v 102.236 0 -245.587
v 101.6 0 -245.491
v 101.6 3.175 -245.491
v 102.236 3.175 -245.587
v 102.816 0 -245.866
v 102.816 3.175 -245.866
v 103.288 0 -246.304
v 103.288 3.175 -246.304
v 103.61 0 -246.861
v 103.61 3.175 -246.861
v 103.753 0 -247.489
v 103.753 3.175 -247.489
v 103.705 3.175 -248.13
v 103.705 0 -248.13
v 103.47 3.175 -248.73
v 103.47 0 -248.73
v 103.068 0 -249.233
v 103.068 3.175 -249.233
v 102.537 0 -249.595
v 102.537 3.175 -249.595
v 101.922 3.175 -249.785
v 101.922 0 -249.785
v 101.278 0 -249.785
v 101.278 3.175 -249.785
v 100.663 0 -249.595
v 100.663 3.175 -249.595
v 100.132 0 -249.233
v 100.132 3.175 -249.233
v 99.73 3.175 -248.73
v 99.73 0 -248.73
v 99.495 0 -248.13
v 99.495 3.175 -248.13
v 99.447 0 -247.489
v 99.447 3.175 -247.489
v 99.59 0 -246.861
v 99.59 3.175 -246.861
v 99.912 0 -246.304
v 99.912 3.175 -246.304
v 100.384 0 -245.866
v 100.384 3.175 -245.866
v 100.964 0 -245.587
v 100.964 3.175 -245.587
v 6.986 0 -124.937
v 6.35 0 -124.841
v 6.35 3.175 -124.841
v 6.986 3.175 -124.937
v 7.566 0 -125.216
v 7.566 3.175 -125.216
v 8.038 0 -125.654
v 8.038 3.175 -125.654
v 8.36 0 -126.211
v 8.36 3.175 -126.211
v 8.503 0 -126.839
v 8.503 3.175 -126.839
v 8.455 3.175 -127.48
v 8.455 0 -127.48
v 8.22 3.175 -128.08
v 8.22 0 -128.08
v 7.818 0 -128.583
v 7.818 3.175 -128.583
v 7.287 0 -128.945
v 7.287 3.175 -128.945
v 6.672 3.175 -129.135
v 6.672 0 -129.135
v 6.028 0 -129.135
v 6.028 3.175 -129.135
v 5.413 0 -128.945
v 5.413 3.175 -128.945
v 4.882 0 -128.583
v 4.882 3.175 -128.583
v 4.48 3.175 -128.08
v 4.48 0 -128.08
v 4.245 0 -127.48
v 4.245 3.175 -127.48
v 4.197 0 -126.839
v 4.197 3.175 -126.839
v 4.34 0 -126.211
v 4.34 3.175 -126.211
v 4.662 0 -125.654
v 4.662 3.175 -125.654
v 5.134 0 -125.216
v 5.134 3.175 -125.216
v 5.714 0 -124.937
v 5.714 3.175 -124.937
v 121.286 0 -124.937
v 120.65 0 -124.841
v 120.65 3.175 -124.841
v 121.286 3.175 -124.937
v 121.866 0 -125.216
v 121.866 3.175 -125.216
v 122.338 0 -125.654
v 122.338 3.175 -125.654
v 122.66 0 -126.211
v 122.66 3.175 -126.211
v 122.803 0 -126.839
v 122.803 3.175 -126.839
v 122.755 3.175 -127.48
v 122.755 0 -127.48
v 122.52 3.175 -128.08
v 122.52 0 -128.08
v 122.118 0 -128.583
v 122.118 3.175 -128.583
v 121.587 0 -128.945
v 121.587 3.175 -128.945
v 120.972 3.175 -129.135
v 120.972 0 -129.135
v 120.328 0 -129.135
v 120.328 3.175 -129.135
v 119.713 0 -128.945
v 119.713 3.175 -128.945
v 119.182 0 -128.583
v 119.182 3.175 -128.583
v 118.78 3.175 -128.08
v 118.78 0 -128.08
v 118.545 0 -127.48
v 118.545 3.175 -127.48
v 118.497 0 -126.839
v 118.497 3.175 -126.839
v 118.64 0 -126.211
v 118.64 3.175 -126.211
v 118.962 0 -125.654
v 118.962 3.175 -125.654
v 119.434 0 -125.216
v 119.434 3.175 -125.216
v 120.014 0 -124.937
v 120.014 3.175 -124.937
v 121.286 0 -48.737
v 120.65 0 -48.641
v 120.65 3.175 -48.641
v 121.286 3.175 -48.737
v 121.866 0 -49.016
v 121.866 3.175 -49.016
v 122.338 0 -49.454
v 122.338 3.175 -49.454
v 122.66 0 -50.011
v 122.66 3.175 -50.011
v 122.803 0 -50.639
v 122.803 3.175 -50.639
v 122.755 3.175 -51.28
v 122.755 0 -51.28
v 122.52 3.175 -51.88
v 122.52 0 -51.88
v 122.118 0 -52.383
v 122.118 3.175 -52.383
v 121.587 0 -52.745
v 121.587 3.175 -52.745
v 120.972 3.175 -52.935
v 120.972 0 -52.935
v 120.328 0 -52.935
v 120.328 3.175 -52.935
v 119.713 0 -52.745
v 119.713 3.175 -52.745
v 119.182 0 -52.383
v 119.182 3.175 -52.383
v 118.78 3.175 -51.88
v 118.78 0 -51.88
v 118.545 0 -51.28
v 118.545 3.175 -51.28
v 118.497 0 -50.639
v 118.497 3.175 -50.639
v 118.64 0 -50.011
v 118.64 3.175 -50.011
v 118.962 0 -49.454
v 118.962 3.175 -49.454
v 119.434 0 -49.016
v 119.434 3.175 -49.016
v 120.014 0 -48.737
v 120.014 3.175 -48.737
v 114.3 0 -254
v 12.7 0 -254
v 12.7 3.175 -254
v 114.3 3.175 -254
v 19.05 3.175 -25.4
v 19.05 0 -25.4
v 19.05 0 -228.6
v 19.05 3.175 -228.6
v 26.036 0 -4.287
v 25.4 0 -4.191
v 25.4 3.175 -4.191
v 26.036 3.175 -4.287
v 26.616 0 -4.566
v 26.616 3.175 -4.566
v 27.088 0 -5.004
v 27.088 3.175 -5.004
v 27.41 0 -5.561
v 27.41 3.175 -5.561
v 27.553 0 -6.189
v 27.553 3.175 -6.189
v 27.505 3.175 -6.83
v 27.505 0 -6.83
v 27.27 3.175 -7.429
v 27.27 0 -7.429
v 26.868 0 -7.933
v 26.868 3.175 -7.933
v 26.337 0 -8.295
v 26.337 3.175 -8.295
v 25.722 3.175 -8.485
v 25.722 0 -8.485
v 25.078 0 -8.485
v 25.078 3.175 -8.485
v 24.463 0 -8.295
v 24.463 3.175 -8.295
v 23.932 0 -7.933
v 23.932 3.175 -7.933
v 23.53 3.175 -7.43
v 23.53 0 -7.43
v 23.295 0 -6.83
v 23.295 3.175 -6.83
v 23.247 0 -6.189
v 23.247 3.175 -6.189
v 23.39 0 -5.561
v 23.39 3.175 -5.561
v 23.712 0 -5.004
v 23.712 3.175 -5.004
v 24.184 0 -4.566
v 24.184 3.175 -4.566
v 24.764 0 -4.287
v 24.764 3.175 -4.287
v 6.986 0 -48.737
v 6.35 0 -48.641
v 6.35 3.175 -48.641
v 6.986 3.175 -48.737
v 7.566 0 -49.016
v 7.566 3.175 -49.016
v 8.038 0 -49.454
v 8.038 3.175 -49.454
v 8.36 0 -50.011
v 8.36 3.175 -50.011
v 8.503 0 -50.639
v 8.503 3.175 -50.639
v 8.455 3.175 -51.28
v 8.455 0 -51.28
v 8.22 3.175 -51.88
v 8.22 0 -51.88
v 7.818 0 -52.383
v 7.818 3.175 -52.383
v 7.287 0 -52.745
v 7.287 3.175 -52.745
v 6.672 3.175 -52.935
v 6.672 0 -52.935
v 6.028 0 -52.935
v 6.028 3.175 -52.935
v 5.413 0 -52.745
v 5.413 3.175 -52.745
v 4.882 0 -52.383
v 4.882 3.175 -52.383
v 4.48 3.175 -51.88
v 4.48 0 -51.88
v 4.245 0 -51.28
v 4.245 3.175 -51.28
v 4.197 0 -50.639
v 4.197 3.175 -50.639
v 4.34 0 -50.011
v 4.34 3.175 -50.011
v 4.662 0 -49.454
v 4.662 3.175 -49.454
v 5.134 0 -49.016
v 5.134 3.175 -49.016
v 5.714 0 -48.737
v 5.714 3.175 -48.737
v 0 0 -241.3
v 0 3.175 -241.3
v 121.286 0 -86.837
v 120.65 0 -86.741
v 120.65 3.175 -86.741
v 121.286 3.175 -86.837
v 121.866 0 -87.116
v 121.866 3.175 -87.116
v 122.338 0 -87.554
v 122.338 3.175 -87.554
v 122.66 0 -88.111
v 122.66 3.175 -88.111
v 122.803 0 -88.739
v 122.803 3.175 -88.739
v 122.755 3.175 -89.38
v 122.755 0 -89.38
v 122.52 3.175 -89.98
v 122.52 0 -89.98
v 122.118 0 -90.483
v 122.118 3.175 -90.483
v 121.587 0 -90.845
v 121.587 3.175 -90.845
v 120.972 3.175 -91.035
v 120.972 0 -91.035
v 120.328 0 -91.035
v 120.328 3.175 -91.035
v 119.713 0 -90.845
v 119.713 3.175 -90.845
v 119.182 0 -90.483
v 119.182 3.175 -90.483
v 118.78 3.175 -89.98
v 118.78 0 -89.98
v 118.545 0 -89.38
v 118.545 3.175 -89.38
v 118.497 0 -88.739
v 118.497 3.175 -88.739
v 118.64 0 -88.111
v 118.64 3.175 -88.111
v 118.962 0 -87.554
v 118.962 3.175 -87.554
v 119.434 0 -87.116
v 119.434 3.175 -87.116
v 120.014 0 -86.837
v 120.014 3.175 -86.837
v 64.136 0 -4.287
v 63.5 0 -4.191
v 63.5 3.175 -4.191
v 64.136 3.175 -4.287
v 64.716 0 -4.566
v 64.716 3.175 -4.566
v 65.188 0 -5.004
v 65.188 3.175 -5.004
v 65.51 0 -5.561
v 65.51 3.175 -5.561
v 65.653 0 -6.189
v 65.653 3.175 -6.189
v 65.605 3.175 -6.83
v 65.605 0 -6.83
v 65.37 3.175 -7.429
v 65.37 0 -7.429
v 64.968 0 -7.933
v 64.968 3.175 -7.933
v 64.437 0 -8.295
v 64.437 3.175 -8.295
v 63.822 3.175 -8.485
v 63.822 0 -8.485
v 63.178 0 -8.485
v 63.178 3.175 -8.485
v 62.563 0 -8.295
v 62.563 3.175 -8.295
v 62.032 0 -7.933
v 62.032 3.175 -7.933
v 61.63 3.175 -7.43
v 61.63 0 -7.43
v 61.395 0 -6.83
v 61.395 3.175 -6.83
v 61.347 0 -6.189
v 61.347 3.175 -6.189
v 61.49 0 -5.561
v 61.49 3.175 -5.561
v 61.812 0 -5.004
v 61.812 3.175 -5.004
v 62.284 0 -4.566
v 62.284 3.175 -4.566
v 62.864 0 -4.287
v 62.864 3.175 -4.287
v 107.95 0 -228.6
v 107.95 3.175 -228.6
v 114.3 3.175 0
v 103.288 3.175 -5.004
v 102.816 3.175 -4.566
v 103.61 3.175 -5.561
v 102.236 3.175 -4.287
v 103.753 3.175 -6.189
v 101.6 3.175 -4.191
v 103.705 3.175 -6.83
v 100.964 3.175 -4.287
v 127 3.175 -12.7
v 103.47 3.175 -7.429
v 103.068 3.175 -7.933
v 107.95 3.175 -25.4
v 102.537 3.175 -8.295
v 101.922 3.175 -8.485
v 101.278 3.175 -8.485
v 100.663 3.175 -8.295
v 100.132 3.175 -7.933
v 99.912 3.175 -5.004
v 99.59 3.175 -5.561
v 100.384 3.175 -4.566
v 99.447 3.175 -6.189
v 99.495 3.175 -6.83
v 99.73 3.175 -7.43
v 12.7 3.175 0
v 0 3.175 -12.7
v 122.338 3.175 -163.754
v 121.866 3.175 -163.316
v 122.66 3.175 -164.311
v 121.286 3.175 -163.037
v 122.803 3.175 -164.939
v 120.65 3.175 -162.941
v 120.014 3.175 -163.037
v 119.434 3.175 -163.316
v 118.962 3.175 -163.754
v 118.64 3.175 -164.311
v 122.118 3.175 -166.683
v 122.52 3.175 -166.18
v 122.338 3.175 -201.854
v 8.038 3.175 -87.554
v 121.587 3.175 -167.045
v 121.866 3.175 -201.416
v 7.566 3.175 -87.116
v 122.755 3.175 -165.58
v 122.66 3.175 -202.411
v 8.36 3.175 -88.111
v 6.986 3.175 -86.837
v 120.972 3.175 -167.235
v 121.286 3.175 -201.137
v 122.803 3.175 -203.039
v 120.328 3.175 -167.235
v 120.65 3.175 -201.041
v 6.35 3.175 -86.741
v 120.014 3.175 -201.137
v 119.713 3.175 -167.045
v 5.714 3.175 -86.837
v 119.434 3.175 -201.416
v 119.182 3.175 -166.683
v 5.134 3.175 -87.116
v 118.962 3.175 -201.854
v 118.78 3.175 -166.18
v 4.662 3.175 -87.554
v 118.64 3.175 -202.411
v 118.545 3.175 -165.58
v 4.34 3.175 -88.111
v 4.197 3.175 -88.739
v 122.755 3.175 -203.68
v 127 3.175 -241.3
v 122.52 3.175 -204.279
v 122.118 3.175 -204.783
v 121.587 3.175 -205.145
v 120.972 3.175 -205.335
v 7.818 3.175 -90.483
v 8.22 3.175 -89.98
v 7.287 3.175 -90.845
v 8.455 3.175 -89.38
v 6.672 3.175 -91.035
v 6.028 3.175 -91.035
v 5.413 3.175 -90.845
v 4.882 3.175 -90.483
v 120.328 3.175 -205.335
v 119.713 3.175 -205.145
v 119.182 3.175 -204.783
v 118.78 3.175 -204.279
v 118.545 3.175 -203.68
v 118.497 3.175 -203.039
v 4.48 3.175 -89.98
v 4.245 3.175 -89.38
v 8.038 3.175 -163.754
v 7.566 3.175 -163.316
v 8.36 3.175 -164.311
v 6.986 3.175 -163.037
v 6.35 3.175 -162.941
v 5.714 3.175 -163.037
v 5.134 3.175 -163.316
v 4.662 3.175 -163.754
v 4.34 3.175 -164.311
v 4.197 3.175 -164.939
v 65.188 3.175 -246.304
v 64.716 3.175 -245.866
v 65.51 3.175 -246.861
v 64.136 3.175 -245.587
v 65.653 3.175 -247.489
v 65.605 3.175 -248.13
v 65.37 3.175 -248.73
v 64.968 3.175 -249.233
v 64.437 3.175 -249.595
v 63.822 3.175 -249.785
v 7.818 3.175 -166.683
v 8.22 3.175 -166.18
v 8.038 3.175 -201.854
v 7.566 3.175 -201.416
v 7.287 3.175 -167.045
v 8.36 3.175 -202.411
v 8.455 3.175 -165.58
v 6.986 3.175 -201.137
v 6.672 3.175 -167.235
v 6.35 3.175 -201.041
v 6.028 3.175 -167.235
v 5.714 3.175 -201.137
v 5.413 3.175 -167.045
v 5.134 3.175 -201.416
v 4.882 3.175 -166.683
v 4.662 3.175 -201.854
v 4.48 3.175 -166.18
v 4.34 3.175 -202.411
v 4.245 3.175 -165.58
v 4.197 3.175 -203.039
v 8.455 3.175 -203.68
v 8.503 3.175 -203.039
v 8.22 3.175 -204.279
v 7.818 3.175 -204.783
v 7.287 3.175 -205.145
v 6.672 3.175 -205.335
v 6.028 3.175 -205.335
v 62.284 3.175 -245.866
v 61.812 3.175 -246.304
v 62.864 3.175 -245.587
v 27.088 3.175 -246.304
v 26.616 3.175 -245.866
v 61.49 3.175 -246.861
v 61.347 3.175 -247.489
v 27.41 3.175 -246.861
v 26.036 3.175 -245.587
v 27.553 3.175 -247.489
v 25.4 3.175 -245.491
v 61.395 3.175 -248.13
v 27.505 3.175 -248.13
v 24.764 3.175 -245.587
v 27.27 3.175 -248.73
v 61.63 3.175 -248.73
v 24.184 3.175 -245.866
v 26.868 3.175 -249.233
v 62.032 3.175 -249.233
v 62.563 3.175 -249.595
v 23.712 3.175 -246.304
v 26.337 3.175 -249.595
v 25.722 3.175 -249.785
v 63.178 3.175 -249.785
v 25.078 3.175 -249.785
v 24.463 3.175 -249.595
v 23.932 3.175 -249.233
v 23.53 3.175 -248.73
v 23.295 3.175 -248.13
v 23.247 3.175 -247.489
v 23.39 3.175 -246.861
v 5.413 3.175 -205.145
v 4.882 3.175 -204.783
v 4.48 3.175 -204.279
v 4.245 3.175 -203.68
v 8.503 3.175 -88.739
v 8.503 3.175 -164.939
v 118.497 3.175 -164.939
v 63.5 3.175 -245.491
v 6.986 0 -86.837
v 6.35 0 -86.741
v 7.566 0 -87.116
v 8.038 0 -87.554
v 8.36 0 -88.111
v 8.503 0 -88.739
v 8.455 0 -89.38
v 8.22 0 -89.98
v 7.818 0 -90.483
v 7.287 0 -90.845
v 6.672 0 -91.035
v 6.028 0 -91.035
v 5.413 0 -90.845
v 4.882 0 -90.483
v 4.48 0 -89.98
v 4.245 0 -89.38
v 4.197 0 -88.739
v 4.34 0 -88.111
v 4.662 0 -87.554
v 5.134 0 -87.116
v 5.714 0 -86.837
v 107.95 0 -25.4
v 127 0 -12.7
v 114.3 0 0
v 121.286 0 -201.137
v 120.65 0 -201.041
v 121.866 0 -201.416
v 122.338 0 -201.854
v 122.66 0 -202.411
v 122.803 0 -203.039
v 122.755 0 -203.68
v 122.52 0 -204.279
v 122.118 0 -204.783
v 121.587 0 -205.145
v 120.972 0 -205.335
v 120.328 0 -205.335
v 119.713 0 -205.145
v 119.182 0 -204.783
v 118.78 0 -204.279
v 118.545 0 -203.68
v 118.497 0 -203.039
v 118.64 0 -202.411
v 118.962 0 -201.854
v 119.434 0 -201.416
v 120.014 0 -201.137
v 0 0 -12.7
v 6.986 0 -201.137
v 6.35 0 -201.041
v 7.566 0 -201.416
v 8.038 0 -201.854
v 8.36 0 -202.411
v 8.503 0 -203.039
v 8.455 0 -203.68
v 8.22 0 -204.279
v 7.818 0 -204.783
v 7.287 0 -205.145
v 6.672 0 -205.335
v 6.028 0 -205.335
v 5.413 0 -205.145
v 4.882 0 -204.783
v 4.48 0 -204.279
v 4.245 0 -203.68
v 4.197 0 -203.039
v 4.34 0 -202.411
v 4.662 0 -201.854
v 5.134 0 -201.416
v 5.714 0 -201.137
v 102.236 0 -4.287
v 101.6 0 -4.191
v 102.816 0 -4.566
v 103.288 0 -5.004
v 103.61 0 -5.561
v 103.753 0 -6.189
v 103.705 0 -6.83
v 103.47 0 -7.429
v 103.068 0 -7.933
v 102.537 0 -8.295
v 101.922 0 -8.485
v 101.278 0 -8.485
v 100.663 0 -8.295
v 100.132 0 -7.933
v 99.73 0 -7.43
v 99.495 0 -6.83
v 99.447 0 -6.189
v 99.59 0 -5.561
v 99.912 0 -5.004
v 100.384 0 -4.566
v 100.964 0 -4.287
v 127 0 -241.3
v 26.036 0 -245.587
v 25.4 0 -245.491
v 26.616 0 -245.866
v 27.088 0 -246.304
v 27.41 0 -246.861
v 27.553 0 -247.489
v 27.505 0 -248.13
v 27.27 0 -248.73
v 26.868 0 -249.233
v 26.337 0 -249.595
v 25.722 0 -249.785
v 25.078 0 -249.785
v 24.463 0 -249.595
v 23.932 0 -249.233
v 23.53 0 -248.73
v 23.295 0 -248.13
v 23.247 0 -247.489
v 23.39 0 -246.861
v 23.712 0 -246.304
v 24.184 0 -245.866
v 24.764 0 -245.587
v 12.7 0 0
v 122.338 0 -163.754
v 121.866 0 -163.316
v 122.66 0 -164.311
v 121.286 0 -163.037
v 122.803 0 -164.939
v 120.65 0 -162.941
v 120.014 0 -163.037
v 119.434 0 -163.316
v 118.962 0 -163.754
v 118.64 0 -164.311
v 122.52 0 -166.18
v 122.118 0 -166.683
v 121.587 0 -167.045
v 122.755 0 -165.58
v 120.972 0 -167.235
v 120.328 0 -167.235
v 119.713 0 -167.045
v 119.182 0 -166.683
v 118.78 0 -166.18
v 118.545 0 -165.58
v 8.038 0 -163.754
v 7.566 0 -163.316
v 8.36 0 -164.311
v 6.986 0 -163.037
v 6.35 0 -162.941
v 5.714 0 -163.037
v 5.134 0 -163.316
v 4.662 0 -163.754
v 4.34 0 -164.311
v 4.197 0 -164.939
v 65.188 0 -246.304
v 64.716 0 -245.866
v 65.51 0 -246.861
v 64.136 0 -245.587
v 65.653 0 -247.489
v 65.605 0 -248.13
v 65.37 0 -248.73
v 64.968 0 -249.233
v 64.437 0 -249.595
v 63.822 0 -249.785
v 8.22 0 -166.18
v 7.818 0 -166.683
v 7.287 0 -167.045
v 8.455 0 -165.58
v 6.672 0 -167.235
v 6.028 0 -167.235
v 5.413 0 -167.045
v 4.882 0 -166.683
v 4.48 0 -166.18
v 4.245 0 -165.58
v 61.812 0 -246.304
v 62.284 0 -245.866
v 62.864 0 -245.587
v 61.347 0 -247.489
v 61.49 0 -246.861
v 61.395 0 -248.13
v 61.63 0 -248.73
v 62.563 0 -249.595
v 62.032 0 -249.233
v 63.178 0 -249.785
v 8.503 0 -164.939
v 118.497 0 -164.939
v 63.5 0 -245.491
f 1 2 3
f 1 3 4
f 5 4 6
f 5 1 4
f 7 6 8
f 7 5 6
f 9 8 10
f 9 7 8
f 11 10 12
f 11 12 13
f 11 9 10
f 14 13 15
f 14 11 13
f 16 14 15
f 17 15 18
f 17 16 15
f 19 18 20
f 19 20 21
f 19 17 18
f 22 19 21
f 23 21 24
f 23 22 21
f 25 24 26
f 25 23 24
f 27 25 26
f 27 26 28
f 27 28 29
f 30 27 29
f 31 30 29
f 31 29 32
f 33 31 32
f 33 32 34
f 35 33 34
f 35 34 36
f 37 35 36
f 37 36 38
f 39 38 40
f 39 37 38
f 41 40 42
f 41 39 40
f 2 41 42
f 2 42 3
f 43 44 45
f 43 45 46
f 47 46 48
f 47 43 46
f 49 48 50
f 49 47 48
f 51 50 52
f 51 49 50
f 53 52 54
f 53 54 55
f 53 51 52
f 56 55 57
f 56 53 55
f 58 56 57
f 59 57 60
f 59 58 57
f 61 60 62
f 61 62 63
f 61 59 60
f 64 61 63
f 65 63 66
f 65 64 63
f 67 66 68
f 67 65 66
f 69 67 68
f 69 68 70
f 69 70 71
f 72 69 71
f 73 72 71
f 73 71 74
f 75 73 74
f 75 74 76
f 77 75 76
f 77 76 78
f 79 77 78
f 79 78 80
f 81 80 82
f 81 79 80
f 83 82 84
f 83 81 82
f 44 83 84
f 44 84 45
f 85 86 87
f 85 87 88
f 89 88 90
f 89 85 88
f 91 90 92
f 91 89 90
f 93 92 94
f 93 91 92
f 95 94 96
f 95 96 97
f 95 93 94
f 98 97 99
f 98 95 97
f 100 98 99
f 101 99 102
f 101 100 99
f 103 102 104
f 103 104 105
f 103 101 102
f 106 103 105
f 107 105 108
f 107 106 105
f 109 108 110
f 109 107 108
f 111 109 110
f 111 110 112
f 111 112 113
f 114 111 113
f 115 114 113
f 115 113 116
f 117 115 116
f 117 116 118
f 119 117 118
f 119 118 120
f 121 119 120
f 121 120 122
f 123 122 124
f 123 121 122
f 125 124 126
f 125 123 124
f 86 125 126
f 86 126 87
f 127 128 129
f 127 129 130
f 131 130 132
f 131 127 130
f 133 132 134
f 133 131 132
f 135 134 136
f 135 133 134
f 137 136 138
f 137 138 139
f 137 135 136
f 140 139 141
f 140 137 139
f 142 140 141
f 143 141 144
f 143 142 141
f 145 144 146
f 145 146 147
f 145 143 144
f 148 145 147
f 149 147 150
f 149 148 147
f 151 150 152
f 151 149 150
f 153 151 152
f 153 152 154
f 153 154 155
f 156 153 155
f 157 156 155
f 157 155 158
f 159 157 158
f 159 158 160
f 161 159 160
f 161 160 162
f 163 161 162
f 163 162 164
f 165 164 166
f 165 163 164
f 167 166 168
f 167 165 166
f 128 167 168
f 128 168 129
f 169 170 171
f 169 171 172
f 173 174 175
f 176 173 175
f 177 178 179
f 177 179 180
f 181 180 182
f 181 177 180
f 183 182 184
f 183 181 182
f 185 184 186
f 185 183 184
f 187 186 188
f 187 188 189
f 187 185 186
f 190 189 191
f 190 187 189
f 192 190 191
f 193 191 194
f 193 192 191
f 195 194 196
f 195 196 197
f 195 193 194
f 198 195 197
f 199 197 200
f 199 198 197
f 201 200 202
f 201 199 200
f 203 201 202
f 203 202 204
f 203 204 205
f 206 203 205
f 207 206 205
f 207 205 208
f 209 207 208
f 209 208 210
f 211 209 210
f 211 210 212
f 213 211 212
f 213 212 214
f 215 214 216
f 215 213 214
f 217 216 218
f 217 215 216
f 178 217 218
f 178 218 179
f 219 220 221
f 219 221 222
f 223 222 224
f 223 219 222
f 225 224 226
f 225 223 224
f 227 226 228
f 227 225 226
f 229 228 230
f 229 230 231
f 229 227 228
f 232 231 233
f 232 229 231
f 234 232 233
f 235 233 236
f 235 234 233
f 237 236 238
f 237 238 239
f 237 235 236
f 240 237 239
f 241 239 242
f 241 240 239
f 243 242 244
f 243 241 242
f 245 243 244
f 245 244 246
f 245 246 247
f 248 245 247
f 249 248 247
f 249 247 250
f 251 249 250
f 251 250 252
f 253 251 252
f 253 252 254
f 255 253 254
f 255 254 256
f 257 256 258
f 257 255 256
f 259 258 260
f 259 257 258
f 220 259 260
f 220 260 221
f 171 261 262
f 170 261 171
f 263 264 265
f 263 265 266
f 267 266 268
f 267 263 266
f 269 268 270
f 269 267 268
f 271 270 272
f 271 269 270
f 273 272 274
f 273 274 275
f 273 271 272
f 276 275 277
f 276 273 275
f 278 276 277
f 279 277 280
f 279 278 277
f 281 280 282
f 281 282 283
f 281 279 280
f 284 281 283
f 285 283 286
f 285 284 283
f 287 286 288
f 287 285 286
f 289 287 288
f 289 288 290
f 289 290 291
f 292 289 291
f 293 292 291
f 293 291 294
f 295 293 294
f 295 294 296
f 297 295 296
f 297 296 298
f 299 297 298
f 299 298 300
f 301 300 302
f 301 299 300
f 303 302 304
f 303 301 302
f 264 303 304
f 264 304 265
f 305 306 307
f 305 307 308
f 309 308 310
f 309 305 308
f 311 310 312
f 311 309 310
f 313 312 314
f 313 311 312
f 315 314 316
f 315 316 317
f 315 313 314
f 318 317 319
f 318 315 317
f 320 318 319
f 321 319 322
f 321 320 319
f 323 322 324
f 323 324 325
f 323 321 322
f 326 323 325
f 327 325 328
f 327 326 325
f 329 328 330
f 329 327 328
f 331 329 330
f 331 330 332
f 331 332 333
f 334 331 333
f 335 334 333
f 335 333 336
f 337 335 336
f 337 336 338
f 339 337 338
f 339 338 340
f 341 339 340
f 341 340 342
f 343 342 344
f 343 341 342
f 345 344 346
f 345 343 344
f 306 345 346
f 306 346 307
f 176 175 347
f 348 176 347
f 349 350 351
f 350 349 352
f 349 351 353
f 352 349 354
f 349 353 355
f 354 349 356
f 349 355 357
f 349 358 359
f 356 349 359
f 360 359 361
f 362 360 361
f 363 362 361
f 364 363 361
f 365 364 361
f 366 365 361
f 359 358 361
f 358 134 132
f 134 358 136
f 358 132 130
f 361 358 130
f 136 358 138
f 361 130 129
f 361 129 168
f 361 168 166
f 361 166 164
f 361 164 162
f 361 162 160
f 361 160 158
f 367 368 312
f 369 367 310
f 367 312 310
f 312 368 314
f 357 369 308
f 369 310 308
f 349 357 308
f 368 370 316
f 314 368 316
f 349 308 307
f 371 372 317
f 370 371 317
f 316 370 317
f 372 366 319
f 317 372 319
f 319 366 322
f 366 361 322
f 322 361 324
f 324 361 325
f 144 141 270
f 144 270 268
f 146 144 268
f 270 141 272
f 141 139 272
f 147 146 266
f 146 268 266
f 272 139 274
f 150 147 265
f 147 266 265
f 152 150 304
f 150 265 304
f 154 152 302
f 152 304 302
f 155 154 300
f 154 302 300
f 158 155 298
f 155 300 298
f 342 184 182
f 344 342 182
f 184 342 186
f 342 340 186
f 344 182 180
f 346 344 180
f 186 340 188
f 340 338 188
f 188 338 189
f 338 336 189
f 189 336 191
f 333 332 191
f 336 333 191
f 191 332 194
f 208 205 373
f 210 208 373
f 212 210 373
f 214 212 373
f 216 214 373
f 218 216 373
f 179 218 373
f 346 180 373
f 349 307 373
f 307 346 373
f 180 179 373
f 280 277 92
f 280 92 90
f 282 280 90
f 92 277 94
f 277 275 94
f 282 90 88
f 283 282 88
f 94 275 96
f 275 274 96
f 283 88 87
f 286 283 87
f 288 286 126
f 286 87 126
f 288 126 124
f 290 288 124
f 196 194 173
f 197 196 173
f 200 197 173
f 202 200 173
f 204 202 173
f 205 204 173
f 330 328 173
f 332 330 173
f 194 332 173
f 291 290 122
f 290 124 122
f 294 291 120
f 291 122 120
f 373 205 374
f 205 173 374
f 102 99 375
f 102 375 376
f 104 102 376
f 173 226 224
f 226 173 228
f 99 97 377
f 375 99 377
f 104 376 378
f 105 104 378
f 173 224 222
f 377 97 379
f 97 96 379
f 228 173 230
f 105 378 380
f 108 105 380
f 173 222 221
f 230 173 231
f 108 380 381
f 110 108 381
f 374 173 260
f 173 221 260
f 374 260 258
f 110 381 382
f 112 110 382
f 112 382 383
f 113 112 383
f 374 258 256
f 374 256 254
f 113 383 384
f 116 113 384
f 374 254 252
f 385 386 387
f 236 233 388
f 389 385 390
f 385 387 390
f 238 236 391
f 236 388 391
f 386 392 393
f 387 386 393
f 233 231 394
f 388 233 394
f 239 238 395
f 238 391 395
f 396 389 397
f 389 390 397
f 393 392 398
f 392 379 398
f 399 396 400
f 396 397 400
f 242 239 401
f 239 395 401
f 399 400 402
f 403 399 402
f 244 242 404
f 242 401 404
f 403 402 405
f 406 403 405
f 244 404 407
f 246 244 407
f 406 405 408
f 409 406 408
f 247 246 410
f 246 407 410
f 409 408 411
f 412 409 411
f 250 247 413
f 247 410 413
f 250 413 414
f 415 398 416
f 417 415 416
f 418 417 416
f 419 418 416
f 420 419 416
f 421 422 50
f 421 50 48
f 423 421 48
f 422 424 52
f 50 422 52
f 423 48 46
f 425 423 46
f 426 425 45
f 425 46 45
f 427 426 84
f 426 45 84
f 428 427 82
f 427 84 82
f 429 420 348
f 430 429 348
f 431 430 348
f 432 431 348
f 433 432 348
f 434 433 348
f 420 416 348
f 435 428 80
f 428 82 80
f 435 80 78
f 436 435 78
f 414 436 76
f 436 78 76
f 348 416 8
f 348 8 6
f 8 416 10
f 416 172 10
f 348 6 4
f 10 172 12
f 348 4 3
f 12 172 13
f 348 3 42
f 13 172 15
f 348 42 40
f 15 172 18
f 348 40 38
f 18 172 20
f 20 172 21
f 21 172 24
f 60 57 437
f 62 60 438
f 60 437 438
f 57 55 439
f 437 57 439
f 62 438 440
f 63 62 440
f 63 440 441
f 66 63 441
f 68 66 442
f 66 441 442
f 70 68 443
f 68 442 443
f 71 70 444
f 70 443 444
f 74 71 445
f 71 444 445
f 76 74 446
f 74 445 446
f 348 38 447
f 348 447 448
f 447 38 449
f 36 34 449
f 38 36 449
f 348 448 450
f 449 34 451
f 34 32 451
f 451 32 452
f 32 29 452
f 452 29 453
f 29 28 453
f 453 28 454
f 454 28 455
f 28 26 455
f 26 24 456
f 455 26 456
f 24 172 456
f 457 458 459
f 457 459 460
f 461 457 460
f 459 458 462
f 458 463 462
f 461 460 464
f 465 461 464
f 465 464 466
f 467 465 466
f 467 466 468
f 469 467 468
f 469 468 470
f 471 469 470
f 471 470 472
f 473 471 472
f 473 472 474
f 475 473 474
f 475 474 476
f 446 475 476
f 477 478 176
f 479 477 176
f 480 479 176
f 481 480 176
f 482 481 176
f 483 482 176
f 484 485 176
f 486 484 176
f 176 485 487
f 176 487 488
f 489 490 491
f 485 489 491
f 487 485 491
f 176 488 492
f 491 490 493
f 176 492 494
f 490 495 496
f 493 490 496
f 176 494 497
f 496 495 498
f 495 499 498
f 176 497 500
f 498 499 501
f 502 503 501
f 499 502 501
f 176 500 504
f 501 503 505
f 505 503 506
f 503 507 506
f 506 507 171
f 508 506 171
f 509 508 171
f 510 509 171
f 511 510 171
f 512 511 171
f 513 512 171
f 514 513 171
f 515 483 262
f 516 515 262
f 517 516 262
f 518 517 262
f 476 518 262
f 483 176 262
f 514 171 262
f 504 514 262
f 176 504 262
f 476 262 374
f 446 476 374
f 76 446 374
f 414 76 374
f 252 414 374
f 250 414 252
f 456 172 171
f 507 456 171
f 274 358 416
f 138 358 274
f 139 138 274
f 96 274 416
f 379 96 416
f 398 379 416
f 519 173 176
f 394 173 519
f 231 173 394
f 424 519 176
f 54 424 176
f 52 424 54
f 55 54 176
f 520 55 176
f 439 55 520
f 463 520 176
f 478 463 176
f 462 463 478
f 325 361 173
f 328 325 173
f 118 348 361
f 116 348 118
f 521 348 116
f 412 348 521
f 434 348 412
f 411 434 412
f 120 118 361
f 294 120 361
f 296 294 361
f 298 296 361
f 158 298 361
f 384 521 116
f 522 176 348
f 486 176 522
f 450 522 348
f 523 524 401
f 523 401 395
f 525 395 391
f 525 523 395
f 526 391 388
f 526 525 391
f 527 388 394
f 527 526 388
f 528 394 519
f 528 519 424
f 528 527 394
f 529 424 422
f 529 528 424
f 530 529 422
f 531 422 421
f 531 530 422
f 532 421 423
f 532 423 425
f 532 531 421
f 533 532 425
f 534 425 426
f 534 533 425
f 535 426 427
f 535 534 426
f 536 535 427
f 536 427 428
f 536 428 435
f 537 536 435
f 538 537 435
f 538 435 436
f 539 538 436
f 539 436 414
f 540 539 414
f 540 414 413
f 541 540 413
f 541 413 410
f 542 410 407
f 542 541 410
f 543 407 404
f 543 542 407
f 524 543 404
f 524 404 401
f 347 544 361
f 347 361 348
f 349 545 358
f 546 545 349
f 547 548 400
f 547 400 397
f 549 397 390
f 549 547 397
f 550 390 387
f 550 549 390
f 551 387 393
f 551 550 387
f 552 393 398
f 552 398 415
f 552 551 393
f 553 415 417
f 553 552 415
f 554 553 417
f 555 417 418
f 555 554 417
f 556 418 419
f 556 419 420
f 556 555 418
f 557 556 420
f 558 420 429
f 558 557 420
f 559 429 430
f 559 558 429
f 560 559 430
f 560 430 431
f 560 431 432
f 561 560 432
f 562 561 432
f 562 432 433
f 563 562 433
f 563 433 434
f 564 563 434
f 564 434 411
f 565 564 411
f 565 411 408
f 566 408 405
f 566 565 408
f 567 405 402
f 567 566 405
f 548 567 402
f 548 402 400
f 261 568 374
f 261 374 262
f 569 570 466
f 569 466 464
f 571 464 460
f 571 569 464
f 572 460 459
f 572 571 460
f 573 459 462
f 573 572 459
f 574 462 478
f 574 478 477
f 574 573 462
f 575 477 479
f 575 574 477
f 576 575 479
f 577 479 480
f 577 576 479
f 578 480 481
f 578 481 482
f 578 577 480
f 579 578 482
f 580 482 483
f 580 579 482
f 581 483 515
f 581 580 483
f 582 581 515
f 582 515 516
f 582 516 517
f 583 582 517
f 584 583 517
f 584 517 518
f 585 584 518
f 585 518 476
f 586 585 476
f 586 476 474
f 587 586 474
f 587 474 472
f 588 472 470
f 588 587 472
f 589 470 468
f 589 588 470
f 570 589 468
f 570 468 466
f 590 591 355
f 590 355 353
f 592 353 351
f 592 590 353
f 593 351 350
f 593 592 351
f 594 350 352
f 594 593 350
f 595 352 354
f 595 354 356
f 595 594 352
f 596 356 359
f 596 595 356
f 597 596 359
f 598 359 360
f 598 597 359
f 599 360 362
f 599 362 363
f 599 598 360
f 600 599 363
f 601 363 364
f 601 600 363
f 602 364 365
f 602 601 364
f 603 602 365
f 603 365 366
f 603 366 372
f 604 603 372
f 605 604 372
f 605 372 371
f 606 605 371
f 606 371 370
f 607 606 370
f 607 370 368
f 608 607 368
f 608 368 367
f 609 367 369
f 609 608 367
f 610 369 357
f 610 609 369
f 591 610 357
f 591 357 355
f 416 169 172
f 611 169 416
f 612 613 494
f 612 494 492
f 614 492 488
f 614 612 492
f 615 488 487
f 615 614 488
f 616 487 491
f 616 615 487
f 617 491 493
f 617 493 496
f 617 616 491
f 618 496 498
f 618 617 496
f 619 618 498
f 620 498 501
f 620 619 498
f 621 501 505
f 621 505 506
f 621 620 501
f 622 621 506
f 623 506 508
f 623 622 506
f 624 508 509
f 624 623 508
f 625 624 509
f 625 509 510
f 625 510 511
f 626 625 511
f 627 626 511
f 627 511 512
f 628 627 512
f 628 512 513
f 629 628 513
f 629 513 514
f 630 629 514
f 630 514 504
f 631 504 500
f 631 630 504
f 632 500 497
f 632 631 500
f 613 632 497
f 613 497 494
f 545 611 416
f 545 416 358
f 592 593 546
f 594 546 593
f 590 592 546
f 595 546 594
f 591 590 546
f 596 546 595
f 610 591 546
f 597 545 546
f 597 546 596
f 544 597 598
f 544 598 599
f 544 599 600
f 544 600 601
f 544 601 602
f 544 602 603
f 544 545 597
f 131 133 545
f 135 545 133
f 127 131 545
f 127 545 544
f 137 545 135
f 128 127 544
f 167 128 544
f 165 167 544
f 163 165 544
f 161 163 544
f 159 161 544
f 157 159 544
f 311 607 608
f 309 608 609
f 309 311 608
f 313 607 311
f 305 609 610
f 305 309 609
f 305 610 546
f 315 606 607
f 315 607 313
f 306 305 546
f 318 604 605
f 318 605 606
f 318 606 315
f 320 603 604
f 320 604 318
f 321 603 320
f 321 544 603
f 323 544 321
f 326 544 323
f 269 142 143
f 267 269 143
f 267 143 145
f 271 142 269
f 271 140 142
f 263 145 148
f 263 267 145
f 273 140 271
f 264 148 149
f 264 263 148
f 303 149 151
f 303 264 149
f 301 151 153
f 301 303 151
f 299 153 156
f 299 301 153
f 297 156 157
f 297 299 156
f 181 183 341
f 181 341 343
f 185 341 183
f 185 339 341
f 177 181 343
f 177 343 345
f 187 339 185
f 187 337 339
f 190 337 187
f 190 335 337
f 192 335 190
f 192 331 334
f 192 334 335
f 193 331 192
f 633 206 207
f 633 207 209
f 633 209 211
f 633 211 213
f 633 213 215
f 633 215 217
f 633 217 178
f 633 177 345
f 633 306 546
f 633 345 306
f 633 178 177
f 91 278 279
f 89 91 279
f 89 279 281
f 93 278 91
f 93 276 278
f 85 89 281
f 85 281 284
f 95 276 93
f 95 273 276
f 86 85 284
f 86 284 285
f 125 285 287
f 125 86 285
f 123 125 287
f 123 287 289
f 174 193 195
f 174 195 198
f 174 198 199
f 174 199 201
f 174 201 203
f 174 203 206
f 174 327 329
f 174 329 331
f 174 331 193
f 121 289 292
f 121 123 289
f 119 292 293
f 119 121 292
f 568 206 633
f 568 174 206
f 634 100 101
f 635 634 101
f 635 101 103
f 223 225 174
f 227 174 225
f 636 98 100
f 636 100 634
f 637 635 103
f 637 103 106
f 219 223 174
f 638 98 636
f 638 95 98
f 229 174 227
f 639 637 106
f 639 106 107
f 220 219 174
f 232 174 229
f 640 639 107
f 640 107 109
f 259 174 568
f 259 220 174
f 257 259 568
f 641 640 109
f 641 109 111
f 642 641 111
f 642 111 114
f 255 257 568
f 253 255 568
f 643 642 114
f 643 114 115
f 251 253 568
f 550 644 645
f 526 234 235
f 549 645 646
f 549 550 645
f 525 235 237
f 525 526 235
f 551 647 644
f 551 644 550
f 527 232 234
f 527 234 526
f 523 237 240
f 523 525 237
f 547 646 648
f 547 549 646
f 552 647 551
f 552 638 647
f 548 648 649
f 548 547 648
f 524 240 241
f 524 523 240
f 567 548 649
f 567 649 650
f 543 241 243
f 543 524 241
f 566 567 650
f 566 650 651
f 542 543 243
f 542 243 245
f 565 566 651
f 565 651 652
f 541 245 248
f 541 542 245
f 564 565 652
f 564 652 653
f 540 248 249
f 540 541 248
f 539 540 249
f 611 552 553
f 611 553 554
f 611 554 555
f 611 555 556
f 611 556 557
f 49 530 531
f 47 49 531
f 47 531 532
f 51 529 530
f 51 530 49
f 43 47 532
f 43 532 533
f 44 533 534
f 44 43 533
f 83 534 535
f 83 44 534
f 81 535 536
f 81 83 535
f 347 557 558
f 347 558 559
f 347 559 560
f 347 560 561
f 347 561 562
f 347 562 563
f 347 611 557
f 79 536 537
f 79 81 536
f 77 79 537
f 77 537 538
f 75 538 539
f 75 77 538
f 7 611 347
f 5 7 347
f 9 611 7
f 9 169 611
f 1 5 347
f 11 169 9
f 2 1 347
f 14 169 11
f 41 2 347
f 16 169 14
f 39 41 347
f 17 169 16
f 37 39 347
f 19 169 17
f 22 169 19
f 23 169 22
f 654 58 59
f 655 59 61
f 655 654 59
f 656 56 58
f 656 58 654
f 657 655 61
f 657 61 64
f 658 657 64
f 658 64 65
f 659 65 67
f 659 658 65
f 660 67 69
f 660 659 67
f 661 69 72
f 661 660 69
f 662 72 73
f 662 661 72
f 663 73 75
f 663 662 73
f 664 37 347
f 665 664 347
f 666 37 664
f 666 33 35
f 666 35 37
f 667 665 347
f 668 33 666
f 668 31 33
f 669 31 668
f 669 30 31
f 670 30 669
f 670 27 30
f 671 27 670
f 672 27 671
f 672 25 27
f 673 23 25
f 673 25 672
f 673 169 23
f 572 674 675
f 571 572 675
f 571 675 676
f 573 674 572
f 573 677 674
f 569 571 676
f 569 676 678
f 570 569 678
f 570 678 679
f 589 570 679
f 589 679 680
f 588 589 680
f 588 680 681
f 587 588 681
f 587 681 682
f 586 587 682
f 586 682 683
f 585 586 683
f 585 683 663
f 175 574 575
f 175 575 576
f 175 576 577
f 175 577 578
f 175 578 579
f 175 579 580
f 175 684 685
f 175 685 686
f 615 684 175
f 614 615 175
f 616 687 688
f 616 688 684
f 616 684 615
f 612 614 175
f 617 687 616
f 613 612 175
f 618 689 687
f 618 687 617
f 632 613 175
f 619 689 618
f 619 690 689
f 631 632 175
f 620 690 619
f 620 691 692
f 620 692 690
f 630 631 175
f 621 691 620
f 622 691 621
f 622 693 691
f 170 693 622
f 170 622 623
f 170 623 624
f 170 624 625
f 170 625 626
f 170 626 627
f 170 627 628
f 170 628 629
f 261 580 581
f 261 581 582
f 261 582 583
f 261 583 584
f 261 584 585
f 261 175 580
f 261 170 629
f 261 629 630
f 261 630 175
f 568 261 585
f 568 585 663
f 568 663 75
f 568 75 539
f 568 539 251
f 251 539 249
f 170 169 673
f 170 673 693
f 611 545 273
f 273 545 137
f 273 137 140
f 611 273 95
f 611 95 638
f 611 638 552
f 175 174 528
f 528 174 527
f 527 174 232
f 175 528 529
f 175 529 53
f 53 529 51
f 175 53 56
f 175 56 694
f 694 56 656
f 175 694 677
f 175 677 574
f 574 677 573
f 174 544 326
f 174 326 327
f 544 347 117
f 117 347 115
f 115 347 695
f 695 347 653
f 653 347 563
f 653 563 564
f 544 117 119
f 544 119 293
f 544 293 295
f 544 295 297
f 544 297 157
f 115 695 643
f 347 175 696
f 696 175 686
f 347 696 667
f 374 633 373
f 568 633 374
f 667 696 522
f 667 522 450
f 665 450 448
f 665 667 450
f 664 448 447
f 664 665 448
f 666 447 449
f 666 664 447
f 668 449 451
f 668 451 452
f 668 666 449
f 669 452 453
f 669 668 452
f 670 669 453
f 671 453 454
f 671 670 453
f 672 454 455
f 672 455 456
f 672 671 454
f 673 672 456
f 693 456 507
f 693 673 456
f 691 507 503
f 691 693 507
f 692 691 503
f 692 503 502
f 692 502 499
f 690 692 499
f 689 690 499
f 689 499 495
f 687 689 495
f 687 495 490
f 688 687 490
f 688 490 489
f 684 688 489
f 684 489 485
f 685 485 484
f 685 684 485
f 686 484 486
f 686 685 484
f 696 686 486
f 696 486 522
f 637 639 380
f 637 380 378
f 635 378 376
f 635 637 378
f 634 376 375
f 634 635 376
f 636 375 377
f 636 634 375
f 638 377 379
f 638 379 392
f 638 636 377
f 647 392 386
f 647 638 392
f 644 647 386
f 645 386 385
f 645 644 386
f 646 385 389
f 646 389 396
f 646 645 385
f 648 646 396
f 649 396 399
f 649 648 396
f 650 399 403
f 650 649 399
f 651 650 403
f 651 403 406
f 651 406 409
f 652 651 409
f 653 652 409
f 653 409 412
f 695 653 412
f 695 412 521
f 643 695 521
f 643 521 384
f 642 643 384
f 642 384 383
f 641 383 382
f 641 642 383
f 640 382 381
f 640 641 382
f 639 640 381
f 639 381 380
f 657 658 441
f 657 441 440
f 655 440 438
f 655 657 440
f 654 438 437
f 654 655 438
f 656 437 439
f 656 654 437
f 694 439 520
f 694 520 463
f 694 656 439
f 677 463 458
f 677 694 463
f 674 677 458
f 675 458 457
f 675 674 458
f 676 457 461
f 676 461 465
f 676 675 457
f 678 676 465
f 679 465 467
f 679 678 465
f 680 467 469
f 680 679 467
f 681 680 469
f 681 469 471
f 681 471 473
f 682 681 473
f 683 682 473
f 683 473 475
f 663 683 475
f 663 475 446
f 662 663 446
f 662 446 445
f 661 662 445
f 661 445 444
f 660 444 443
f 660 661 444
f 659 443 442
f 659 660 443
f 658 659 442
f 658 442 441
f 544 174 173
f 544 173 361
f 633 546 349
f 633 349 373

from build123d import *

# Parameters (mm, degrees)
SKETCH2_R           = 2.159
SKETCH2_W           = 88.9
SKETCH2_H           = 203.2
BOSS_EXTRUDE1_DEPTH = 3.175


with BuildPart() as part:
    # Sketch2 → Boss-Extrude1 (new body)
    with BuildSketch(Plane(origin=(0, 0, 0), x_dir=(1, 0, 0), z_dir=(0, 1, 0))):
        Polygon((0, 12.7), (0, 241.3), (12.7, 254), (114.3, 254), (127, 241.3), (127, 12.7), (114.3, 0), (12.7, 0), align=None)
        with Locations(Location((6.35, 165.1, 0), (0, 0, 270))):
            Circle(SKETCH2_R, mode=Mode.SUBTRACT)
        with Locations(Location((25.4, 247.65, 0), (0, 0, 270))):
            Circle(SKETCH2_R, mode=Mode.SUBTRACT)
        with Locations(Location((6.35, 203.2, 0), (0, 0, 270))):
            Circle(SKETCH2_R, mode=Mode.SUBTRACT)
        with Locations(Location((63.5, 247.65, 0), (0, 0, 270))):
            Circle(SKETCH2_R, mode=Mode.SUBTRACT)
        with Locations(Location((6.35, 127, 0), (0, 0, 270))):
            Circle(SKETCH2_R, mode=Mode.SUBTRACT)
        with Locations(Location((120.65, 127, 0), (0, 0, 270))):
            Circle(SKETCH2_R, mode=Mode.SUBTRACT)
        with Locations(Location((120.65, 165.1, 0), (0, 0, 270))):
            Circle(SKETCH2_R, mode=Mode.SUBTRACT)
        with Locations(Location((120.65, 203.2, 0), (0, 0, 270))):
            Circle(SKETCH2_R, mode=Mode.SUBTRACT)
        with Locations(Location((101.6, 247.65, 0), (0, 0, 270))):
            Circle(SKETCH2_R, mode=Mode.SUBTRACT)
        with Locations(Location((101.6, 6.35, 0), (0, 0, 270))):
            Circle(SKETCH2_R, mode=Mode.SUBTRACT)
        with Locations(Location((63.5, 6.35, 0), (0, 0, 270))):
            Circle(SKETCH2_R, mode=Mode.SUBTRACT)
        with Locations(Location((25.4, 6.35, 0), (0, 0, 270))):
            Circle(SKETCH2_R, mode=Mode.SUBTRACT)
        with Locations(Location((120.65, 50.8, 0), (0, 0, 270))):
            Circle(SKETCH2_R, mode=Mode.SUBTRACT)
        with Locations(Location((6.35, 50.8, 0), (0, 0, 270))):
            Circle(SKETCH2_R, mode=Mode.SUBTRACT)
        with Locations(Location((120.65, 88.9, 0), (0, 0, 270))):
            Circle(SKETCH2_R, mode=Mode.SUBTRACT)
        with Locations(Location((6.35, 88.9, 0), (0, 0, 270))):
            Circle(SKETCH2_R, mode=Mode.SUBTRACT)
        with Locations((63.5, 127)):
            Rectangle(SKETCH2_W, SKETCH2_H, mode=Mode.SUBTRACT)
    extrude(amount=BOSS_EXTRUDE1_DEPTH)


solid = part.part
